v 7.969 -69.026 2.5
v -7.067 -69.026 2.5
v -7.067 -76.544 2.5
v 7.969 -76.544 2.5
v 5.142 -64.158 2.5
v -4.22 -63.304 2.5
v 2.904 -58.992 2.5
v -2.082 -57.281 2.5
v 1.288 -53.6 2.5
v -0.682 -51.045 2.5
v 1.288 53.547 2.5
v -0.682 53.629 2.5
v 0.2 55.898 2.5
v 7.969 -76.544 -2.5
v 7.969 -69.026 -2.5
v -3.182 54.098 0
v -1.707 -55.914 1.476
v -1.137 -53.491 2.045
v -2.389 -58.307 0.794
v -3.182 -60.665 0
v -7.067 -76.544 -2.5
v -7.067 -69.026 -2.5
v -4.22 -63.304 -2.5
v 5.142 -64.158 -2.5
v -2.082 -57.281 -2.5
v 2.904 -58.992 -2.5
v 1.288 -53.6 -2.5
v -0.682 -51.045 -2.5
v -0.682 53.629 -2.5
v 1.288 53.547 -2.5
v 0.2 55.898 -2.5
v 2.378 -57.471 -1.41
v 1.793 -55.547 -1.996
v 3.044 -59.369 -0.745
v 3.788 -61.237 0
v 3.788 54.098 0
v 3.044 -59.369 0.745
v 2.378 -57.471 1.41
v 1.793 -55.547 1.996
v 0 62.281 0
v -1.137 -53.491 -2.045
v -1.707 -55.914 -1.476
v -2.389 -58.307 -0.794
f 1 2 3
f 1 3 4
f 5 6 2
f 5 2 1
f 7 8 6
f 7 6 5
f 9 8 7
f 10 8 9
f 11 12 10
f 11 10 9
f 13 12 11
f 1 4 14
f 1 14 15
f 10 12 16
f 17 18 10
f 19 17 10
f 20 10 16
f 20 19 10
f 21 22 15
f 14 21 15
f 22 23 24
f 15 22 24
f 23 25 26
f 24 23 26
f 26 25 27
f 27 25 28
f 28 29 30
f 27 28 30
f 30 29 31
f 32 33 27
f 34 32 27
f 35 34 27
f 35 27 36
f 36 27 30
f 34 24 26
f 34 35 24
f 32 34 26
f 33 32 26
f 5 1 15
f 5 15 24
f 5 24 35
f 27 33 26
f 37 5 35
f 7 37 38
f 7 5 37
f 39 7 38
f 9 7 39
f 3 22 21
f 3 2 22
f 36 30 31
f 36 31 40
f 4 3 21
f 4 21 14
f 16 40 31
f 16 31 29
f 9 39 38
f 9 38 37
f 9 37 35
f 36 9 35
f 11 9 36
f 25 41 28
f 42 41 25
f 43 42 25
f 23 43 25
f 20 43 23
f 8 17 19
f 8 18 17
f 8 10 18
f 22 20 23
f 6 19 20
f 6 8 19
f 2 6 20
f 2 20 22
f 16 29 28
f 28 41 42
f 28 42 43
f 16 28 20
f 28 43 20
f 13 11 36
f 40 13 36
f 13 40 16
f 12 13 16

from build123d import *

# Parameters (mm, degrees)
F1_DEPTH = 2.5
F2_SIZE  = 2.49999
F4_DEPTH = 2.5


# Not quite as in the source:
# - a fillet or chamfer is up to 0.001 mm smaller than in the source, because OpenCascade refuses the exact size


with BuildPart() as f1:
    # F0 (on Top) → F1 (new body, symmetric)
    with BuildSketch(Plane.XY):
        Polygon((-3.1822135206, 54.0976710618), (-3.1822135206, -76.2216448784), (3.7883522455, -76.2216448784), (3.7883522455, 54.0976710618), (0, 62.2805096209), align=None)
    extrude(amount=F1_DEPTH, both=True)

    # F2 (size 2.5 in the source; OpenCascade refuses exactly that, so slightly less here)
    f2_edges = [f1.edges().sort_by_distance(p)[0] for p in [
        (-1.591107, 58.18909, -2.5),
        (-3.182214, -11.061987, -2.5),
        (0.303069, -76.221645, -2.5),
        (3.788352, -11.061987, -2.5),
        (1.894176, 58.18909, -2.5),
        (-1.591107, 58.18909, 2.5),
        (-3.182214, -11.061987, 2.5),
        (0.303069, -76.221645, 2.5),
        (3.788352, -11.061987, 2.5),
        (1.894176, 58.18909, 2.5),
    ]]
    chamfer(f2_edges, length=F2_SIZE)

    # F3 (on Top) → F4 (join, symmetric)
    with BuildSketch(Plane.XY):
        with BuildLine():
            Line((-7.067034021, -69.0257325768), (-7.067034021, -76.5438452363))
            Line((-7.067034021, -76.5438452363), (7.9692080617, -76.5438452363))
            Line((7.9692080617, -76.5438452363), (7.9692080617, -69.0257325768))
            ThreePointArc((7.9692080617, -69.0257325768), (2.0355302464, -56.380771616), (0, -42.5619371235))
            ThreePointArc((0, -42.5619371235), (-1.7971813817, -56.2575152388), (-7.067034021, -69.0257325768))
        make_face()
    extrude(amount=F4_DEPTH, both=True)


solid = f1.part
